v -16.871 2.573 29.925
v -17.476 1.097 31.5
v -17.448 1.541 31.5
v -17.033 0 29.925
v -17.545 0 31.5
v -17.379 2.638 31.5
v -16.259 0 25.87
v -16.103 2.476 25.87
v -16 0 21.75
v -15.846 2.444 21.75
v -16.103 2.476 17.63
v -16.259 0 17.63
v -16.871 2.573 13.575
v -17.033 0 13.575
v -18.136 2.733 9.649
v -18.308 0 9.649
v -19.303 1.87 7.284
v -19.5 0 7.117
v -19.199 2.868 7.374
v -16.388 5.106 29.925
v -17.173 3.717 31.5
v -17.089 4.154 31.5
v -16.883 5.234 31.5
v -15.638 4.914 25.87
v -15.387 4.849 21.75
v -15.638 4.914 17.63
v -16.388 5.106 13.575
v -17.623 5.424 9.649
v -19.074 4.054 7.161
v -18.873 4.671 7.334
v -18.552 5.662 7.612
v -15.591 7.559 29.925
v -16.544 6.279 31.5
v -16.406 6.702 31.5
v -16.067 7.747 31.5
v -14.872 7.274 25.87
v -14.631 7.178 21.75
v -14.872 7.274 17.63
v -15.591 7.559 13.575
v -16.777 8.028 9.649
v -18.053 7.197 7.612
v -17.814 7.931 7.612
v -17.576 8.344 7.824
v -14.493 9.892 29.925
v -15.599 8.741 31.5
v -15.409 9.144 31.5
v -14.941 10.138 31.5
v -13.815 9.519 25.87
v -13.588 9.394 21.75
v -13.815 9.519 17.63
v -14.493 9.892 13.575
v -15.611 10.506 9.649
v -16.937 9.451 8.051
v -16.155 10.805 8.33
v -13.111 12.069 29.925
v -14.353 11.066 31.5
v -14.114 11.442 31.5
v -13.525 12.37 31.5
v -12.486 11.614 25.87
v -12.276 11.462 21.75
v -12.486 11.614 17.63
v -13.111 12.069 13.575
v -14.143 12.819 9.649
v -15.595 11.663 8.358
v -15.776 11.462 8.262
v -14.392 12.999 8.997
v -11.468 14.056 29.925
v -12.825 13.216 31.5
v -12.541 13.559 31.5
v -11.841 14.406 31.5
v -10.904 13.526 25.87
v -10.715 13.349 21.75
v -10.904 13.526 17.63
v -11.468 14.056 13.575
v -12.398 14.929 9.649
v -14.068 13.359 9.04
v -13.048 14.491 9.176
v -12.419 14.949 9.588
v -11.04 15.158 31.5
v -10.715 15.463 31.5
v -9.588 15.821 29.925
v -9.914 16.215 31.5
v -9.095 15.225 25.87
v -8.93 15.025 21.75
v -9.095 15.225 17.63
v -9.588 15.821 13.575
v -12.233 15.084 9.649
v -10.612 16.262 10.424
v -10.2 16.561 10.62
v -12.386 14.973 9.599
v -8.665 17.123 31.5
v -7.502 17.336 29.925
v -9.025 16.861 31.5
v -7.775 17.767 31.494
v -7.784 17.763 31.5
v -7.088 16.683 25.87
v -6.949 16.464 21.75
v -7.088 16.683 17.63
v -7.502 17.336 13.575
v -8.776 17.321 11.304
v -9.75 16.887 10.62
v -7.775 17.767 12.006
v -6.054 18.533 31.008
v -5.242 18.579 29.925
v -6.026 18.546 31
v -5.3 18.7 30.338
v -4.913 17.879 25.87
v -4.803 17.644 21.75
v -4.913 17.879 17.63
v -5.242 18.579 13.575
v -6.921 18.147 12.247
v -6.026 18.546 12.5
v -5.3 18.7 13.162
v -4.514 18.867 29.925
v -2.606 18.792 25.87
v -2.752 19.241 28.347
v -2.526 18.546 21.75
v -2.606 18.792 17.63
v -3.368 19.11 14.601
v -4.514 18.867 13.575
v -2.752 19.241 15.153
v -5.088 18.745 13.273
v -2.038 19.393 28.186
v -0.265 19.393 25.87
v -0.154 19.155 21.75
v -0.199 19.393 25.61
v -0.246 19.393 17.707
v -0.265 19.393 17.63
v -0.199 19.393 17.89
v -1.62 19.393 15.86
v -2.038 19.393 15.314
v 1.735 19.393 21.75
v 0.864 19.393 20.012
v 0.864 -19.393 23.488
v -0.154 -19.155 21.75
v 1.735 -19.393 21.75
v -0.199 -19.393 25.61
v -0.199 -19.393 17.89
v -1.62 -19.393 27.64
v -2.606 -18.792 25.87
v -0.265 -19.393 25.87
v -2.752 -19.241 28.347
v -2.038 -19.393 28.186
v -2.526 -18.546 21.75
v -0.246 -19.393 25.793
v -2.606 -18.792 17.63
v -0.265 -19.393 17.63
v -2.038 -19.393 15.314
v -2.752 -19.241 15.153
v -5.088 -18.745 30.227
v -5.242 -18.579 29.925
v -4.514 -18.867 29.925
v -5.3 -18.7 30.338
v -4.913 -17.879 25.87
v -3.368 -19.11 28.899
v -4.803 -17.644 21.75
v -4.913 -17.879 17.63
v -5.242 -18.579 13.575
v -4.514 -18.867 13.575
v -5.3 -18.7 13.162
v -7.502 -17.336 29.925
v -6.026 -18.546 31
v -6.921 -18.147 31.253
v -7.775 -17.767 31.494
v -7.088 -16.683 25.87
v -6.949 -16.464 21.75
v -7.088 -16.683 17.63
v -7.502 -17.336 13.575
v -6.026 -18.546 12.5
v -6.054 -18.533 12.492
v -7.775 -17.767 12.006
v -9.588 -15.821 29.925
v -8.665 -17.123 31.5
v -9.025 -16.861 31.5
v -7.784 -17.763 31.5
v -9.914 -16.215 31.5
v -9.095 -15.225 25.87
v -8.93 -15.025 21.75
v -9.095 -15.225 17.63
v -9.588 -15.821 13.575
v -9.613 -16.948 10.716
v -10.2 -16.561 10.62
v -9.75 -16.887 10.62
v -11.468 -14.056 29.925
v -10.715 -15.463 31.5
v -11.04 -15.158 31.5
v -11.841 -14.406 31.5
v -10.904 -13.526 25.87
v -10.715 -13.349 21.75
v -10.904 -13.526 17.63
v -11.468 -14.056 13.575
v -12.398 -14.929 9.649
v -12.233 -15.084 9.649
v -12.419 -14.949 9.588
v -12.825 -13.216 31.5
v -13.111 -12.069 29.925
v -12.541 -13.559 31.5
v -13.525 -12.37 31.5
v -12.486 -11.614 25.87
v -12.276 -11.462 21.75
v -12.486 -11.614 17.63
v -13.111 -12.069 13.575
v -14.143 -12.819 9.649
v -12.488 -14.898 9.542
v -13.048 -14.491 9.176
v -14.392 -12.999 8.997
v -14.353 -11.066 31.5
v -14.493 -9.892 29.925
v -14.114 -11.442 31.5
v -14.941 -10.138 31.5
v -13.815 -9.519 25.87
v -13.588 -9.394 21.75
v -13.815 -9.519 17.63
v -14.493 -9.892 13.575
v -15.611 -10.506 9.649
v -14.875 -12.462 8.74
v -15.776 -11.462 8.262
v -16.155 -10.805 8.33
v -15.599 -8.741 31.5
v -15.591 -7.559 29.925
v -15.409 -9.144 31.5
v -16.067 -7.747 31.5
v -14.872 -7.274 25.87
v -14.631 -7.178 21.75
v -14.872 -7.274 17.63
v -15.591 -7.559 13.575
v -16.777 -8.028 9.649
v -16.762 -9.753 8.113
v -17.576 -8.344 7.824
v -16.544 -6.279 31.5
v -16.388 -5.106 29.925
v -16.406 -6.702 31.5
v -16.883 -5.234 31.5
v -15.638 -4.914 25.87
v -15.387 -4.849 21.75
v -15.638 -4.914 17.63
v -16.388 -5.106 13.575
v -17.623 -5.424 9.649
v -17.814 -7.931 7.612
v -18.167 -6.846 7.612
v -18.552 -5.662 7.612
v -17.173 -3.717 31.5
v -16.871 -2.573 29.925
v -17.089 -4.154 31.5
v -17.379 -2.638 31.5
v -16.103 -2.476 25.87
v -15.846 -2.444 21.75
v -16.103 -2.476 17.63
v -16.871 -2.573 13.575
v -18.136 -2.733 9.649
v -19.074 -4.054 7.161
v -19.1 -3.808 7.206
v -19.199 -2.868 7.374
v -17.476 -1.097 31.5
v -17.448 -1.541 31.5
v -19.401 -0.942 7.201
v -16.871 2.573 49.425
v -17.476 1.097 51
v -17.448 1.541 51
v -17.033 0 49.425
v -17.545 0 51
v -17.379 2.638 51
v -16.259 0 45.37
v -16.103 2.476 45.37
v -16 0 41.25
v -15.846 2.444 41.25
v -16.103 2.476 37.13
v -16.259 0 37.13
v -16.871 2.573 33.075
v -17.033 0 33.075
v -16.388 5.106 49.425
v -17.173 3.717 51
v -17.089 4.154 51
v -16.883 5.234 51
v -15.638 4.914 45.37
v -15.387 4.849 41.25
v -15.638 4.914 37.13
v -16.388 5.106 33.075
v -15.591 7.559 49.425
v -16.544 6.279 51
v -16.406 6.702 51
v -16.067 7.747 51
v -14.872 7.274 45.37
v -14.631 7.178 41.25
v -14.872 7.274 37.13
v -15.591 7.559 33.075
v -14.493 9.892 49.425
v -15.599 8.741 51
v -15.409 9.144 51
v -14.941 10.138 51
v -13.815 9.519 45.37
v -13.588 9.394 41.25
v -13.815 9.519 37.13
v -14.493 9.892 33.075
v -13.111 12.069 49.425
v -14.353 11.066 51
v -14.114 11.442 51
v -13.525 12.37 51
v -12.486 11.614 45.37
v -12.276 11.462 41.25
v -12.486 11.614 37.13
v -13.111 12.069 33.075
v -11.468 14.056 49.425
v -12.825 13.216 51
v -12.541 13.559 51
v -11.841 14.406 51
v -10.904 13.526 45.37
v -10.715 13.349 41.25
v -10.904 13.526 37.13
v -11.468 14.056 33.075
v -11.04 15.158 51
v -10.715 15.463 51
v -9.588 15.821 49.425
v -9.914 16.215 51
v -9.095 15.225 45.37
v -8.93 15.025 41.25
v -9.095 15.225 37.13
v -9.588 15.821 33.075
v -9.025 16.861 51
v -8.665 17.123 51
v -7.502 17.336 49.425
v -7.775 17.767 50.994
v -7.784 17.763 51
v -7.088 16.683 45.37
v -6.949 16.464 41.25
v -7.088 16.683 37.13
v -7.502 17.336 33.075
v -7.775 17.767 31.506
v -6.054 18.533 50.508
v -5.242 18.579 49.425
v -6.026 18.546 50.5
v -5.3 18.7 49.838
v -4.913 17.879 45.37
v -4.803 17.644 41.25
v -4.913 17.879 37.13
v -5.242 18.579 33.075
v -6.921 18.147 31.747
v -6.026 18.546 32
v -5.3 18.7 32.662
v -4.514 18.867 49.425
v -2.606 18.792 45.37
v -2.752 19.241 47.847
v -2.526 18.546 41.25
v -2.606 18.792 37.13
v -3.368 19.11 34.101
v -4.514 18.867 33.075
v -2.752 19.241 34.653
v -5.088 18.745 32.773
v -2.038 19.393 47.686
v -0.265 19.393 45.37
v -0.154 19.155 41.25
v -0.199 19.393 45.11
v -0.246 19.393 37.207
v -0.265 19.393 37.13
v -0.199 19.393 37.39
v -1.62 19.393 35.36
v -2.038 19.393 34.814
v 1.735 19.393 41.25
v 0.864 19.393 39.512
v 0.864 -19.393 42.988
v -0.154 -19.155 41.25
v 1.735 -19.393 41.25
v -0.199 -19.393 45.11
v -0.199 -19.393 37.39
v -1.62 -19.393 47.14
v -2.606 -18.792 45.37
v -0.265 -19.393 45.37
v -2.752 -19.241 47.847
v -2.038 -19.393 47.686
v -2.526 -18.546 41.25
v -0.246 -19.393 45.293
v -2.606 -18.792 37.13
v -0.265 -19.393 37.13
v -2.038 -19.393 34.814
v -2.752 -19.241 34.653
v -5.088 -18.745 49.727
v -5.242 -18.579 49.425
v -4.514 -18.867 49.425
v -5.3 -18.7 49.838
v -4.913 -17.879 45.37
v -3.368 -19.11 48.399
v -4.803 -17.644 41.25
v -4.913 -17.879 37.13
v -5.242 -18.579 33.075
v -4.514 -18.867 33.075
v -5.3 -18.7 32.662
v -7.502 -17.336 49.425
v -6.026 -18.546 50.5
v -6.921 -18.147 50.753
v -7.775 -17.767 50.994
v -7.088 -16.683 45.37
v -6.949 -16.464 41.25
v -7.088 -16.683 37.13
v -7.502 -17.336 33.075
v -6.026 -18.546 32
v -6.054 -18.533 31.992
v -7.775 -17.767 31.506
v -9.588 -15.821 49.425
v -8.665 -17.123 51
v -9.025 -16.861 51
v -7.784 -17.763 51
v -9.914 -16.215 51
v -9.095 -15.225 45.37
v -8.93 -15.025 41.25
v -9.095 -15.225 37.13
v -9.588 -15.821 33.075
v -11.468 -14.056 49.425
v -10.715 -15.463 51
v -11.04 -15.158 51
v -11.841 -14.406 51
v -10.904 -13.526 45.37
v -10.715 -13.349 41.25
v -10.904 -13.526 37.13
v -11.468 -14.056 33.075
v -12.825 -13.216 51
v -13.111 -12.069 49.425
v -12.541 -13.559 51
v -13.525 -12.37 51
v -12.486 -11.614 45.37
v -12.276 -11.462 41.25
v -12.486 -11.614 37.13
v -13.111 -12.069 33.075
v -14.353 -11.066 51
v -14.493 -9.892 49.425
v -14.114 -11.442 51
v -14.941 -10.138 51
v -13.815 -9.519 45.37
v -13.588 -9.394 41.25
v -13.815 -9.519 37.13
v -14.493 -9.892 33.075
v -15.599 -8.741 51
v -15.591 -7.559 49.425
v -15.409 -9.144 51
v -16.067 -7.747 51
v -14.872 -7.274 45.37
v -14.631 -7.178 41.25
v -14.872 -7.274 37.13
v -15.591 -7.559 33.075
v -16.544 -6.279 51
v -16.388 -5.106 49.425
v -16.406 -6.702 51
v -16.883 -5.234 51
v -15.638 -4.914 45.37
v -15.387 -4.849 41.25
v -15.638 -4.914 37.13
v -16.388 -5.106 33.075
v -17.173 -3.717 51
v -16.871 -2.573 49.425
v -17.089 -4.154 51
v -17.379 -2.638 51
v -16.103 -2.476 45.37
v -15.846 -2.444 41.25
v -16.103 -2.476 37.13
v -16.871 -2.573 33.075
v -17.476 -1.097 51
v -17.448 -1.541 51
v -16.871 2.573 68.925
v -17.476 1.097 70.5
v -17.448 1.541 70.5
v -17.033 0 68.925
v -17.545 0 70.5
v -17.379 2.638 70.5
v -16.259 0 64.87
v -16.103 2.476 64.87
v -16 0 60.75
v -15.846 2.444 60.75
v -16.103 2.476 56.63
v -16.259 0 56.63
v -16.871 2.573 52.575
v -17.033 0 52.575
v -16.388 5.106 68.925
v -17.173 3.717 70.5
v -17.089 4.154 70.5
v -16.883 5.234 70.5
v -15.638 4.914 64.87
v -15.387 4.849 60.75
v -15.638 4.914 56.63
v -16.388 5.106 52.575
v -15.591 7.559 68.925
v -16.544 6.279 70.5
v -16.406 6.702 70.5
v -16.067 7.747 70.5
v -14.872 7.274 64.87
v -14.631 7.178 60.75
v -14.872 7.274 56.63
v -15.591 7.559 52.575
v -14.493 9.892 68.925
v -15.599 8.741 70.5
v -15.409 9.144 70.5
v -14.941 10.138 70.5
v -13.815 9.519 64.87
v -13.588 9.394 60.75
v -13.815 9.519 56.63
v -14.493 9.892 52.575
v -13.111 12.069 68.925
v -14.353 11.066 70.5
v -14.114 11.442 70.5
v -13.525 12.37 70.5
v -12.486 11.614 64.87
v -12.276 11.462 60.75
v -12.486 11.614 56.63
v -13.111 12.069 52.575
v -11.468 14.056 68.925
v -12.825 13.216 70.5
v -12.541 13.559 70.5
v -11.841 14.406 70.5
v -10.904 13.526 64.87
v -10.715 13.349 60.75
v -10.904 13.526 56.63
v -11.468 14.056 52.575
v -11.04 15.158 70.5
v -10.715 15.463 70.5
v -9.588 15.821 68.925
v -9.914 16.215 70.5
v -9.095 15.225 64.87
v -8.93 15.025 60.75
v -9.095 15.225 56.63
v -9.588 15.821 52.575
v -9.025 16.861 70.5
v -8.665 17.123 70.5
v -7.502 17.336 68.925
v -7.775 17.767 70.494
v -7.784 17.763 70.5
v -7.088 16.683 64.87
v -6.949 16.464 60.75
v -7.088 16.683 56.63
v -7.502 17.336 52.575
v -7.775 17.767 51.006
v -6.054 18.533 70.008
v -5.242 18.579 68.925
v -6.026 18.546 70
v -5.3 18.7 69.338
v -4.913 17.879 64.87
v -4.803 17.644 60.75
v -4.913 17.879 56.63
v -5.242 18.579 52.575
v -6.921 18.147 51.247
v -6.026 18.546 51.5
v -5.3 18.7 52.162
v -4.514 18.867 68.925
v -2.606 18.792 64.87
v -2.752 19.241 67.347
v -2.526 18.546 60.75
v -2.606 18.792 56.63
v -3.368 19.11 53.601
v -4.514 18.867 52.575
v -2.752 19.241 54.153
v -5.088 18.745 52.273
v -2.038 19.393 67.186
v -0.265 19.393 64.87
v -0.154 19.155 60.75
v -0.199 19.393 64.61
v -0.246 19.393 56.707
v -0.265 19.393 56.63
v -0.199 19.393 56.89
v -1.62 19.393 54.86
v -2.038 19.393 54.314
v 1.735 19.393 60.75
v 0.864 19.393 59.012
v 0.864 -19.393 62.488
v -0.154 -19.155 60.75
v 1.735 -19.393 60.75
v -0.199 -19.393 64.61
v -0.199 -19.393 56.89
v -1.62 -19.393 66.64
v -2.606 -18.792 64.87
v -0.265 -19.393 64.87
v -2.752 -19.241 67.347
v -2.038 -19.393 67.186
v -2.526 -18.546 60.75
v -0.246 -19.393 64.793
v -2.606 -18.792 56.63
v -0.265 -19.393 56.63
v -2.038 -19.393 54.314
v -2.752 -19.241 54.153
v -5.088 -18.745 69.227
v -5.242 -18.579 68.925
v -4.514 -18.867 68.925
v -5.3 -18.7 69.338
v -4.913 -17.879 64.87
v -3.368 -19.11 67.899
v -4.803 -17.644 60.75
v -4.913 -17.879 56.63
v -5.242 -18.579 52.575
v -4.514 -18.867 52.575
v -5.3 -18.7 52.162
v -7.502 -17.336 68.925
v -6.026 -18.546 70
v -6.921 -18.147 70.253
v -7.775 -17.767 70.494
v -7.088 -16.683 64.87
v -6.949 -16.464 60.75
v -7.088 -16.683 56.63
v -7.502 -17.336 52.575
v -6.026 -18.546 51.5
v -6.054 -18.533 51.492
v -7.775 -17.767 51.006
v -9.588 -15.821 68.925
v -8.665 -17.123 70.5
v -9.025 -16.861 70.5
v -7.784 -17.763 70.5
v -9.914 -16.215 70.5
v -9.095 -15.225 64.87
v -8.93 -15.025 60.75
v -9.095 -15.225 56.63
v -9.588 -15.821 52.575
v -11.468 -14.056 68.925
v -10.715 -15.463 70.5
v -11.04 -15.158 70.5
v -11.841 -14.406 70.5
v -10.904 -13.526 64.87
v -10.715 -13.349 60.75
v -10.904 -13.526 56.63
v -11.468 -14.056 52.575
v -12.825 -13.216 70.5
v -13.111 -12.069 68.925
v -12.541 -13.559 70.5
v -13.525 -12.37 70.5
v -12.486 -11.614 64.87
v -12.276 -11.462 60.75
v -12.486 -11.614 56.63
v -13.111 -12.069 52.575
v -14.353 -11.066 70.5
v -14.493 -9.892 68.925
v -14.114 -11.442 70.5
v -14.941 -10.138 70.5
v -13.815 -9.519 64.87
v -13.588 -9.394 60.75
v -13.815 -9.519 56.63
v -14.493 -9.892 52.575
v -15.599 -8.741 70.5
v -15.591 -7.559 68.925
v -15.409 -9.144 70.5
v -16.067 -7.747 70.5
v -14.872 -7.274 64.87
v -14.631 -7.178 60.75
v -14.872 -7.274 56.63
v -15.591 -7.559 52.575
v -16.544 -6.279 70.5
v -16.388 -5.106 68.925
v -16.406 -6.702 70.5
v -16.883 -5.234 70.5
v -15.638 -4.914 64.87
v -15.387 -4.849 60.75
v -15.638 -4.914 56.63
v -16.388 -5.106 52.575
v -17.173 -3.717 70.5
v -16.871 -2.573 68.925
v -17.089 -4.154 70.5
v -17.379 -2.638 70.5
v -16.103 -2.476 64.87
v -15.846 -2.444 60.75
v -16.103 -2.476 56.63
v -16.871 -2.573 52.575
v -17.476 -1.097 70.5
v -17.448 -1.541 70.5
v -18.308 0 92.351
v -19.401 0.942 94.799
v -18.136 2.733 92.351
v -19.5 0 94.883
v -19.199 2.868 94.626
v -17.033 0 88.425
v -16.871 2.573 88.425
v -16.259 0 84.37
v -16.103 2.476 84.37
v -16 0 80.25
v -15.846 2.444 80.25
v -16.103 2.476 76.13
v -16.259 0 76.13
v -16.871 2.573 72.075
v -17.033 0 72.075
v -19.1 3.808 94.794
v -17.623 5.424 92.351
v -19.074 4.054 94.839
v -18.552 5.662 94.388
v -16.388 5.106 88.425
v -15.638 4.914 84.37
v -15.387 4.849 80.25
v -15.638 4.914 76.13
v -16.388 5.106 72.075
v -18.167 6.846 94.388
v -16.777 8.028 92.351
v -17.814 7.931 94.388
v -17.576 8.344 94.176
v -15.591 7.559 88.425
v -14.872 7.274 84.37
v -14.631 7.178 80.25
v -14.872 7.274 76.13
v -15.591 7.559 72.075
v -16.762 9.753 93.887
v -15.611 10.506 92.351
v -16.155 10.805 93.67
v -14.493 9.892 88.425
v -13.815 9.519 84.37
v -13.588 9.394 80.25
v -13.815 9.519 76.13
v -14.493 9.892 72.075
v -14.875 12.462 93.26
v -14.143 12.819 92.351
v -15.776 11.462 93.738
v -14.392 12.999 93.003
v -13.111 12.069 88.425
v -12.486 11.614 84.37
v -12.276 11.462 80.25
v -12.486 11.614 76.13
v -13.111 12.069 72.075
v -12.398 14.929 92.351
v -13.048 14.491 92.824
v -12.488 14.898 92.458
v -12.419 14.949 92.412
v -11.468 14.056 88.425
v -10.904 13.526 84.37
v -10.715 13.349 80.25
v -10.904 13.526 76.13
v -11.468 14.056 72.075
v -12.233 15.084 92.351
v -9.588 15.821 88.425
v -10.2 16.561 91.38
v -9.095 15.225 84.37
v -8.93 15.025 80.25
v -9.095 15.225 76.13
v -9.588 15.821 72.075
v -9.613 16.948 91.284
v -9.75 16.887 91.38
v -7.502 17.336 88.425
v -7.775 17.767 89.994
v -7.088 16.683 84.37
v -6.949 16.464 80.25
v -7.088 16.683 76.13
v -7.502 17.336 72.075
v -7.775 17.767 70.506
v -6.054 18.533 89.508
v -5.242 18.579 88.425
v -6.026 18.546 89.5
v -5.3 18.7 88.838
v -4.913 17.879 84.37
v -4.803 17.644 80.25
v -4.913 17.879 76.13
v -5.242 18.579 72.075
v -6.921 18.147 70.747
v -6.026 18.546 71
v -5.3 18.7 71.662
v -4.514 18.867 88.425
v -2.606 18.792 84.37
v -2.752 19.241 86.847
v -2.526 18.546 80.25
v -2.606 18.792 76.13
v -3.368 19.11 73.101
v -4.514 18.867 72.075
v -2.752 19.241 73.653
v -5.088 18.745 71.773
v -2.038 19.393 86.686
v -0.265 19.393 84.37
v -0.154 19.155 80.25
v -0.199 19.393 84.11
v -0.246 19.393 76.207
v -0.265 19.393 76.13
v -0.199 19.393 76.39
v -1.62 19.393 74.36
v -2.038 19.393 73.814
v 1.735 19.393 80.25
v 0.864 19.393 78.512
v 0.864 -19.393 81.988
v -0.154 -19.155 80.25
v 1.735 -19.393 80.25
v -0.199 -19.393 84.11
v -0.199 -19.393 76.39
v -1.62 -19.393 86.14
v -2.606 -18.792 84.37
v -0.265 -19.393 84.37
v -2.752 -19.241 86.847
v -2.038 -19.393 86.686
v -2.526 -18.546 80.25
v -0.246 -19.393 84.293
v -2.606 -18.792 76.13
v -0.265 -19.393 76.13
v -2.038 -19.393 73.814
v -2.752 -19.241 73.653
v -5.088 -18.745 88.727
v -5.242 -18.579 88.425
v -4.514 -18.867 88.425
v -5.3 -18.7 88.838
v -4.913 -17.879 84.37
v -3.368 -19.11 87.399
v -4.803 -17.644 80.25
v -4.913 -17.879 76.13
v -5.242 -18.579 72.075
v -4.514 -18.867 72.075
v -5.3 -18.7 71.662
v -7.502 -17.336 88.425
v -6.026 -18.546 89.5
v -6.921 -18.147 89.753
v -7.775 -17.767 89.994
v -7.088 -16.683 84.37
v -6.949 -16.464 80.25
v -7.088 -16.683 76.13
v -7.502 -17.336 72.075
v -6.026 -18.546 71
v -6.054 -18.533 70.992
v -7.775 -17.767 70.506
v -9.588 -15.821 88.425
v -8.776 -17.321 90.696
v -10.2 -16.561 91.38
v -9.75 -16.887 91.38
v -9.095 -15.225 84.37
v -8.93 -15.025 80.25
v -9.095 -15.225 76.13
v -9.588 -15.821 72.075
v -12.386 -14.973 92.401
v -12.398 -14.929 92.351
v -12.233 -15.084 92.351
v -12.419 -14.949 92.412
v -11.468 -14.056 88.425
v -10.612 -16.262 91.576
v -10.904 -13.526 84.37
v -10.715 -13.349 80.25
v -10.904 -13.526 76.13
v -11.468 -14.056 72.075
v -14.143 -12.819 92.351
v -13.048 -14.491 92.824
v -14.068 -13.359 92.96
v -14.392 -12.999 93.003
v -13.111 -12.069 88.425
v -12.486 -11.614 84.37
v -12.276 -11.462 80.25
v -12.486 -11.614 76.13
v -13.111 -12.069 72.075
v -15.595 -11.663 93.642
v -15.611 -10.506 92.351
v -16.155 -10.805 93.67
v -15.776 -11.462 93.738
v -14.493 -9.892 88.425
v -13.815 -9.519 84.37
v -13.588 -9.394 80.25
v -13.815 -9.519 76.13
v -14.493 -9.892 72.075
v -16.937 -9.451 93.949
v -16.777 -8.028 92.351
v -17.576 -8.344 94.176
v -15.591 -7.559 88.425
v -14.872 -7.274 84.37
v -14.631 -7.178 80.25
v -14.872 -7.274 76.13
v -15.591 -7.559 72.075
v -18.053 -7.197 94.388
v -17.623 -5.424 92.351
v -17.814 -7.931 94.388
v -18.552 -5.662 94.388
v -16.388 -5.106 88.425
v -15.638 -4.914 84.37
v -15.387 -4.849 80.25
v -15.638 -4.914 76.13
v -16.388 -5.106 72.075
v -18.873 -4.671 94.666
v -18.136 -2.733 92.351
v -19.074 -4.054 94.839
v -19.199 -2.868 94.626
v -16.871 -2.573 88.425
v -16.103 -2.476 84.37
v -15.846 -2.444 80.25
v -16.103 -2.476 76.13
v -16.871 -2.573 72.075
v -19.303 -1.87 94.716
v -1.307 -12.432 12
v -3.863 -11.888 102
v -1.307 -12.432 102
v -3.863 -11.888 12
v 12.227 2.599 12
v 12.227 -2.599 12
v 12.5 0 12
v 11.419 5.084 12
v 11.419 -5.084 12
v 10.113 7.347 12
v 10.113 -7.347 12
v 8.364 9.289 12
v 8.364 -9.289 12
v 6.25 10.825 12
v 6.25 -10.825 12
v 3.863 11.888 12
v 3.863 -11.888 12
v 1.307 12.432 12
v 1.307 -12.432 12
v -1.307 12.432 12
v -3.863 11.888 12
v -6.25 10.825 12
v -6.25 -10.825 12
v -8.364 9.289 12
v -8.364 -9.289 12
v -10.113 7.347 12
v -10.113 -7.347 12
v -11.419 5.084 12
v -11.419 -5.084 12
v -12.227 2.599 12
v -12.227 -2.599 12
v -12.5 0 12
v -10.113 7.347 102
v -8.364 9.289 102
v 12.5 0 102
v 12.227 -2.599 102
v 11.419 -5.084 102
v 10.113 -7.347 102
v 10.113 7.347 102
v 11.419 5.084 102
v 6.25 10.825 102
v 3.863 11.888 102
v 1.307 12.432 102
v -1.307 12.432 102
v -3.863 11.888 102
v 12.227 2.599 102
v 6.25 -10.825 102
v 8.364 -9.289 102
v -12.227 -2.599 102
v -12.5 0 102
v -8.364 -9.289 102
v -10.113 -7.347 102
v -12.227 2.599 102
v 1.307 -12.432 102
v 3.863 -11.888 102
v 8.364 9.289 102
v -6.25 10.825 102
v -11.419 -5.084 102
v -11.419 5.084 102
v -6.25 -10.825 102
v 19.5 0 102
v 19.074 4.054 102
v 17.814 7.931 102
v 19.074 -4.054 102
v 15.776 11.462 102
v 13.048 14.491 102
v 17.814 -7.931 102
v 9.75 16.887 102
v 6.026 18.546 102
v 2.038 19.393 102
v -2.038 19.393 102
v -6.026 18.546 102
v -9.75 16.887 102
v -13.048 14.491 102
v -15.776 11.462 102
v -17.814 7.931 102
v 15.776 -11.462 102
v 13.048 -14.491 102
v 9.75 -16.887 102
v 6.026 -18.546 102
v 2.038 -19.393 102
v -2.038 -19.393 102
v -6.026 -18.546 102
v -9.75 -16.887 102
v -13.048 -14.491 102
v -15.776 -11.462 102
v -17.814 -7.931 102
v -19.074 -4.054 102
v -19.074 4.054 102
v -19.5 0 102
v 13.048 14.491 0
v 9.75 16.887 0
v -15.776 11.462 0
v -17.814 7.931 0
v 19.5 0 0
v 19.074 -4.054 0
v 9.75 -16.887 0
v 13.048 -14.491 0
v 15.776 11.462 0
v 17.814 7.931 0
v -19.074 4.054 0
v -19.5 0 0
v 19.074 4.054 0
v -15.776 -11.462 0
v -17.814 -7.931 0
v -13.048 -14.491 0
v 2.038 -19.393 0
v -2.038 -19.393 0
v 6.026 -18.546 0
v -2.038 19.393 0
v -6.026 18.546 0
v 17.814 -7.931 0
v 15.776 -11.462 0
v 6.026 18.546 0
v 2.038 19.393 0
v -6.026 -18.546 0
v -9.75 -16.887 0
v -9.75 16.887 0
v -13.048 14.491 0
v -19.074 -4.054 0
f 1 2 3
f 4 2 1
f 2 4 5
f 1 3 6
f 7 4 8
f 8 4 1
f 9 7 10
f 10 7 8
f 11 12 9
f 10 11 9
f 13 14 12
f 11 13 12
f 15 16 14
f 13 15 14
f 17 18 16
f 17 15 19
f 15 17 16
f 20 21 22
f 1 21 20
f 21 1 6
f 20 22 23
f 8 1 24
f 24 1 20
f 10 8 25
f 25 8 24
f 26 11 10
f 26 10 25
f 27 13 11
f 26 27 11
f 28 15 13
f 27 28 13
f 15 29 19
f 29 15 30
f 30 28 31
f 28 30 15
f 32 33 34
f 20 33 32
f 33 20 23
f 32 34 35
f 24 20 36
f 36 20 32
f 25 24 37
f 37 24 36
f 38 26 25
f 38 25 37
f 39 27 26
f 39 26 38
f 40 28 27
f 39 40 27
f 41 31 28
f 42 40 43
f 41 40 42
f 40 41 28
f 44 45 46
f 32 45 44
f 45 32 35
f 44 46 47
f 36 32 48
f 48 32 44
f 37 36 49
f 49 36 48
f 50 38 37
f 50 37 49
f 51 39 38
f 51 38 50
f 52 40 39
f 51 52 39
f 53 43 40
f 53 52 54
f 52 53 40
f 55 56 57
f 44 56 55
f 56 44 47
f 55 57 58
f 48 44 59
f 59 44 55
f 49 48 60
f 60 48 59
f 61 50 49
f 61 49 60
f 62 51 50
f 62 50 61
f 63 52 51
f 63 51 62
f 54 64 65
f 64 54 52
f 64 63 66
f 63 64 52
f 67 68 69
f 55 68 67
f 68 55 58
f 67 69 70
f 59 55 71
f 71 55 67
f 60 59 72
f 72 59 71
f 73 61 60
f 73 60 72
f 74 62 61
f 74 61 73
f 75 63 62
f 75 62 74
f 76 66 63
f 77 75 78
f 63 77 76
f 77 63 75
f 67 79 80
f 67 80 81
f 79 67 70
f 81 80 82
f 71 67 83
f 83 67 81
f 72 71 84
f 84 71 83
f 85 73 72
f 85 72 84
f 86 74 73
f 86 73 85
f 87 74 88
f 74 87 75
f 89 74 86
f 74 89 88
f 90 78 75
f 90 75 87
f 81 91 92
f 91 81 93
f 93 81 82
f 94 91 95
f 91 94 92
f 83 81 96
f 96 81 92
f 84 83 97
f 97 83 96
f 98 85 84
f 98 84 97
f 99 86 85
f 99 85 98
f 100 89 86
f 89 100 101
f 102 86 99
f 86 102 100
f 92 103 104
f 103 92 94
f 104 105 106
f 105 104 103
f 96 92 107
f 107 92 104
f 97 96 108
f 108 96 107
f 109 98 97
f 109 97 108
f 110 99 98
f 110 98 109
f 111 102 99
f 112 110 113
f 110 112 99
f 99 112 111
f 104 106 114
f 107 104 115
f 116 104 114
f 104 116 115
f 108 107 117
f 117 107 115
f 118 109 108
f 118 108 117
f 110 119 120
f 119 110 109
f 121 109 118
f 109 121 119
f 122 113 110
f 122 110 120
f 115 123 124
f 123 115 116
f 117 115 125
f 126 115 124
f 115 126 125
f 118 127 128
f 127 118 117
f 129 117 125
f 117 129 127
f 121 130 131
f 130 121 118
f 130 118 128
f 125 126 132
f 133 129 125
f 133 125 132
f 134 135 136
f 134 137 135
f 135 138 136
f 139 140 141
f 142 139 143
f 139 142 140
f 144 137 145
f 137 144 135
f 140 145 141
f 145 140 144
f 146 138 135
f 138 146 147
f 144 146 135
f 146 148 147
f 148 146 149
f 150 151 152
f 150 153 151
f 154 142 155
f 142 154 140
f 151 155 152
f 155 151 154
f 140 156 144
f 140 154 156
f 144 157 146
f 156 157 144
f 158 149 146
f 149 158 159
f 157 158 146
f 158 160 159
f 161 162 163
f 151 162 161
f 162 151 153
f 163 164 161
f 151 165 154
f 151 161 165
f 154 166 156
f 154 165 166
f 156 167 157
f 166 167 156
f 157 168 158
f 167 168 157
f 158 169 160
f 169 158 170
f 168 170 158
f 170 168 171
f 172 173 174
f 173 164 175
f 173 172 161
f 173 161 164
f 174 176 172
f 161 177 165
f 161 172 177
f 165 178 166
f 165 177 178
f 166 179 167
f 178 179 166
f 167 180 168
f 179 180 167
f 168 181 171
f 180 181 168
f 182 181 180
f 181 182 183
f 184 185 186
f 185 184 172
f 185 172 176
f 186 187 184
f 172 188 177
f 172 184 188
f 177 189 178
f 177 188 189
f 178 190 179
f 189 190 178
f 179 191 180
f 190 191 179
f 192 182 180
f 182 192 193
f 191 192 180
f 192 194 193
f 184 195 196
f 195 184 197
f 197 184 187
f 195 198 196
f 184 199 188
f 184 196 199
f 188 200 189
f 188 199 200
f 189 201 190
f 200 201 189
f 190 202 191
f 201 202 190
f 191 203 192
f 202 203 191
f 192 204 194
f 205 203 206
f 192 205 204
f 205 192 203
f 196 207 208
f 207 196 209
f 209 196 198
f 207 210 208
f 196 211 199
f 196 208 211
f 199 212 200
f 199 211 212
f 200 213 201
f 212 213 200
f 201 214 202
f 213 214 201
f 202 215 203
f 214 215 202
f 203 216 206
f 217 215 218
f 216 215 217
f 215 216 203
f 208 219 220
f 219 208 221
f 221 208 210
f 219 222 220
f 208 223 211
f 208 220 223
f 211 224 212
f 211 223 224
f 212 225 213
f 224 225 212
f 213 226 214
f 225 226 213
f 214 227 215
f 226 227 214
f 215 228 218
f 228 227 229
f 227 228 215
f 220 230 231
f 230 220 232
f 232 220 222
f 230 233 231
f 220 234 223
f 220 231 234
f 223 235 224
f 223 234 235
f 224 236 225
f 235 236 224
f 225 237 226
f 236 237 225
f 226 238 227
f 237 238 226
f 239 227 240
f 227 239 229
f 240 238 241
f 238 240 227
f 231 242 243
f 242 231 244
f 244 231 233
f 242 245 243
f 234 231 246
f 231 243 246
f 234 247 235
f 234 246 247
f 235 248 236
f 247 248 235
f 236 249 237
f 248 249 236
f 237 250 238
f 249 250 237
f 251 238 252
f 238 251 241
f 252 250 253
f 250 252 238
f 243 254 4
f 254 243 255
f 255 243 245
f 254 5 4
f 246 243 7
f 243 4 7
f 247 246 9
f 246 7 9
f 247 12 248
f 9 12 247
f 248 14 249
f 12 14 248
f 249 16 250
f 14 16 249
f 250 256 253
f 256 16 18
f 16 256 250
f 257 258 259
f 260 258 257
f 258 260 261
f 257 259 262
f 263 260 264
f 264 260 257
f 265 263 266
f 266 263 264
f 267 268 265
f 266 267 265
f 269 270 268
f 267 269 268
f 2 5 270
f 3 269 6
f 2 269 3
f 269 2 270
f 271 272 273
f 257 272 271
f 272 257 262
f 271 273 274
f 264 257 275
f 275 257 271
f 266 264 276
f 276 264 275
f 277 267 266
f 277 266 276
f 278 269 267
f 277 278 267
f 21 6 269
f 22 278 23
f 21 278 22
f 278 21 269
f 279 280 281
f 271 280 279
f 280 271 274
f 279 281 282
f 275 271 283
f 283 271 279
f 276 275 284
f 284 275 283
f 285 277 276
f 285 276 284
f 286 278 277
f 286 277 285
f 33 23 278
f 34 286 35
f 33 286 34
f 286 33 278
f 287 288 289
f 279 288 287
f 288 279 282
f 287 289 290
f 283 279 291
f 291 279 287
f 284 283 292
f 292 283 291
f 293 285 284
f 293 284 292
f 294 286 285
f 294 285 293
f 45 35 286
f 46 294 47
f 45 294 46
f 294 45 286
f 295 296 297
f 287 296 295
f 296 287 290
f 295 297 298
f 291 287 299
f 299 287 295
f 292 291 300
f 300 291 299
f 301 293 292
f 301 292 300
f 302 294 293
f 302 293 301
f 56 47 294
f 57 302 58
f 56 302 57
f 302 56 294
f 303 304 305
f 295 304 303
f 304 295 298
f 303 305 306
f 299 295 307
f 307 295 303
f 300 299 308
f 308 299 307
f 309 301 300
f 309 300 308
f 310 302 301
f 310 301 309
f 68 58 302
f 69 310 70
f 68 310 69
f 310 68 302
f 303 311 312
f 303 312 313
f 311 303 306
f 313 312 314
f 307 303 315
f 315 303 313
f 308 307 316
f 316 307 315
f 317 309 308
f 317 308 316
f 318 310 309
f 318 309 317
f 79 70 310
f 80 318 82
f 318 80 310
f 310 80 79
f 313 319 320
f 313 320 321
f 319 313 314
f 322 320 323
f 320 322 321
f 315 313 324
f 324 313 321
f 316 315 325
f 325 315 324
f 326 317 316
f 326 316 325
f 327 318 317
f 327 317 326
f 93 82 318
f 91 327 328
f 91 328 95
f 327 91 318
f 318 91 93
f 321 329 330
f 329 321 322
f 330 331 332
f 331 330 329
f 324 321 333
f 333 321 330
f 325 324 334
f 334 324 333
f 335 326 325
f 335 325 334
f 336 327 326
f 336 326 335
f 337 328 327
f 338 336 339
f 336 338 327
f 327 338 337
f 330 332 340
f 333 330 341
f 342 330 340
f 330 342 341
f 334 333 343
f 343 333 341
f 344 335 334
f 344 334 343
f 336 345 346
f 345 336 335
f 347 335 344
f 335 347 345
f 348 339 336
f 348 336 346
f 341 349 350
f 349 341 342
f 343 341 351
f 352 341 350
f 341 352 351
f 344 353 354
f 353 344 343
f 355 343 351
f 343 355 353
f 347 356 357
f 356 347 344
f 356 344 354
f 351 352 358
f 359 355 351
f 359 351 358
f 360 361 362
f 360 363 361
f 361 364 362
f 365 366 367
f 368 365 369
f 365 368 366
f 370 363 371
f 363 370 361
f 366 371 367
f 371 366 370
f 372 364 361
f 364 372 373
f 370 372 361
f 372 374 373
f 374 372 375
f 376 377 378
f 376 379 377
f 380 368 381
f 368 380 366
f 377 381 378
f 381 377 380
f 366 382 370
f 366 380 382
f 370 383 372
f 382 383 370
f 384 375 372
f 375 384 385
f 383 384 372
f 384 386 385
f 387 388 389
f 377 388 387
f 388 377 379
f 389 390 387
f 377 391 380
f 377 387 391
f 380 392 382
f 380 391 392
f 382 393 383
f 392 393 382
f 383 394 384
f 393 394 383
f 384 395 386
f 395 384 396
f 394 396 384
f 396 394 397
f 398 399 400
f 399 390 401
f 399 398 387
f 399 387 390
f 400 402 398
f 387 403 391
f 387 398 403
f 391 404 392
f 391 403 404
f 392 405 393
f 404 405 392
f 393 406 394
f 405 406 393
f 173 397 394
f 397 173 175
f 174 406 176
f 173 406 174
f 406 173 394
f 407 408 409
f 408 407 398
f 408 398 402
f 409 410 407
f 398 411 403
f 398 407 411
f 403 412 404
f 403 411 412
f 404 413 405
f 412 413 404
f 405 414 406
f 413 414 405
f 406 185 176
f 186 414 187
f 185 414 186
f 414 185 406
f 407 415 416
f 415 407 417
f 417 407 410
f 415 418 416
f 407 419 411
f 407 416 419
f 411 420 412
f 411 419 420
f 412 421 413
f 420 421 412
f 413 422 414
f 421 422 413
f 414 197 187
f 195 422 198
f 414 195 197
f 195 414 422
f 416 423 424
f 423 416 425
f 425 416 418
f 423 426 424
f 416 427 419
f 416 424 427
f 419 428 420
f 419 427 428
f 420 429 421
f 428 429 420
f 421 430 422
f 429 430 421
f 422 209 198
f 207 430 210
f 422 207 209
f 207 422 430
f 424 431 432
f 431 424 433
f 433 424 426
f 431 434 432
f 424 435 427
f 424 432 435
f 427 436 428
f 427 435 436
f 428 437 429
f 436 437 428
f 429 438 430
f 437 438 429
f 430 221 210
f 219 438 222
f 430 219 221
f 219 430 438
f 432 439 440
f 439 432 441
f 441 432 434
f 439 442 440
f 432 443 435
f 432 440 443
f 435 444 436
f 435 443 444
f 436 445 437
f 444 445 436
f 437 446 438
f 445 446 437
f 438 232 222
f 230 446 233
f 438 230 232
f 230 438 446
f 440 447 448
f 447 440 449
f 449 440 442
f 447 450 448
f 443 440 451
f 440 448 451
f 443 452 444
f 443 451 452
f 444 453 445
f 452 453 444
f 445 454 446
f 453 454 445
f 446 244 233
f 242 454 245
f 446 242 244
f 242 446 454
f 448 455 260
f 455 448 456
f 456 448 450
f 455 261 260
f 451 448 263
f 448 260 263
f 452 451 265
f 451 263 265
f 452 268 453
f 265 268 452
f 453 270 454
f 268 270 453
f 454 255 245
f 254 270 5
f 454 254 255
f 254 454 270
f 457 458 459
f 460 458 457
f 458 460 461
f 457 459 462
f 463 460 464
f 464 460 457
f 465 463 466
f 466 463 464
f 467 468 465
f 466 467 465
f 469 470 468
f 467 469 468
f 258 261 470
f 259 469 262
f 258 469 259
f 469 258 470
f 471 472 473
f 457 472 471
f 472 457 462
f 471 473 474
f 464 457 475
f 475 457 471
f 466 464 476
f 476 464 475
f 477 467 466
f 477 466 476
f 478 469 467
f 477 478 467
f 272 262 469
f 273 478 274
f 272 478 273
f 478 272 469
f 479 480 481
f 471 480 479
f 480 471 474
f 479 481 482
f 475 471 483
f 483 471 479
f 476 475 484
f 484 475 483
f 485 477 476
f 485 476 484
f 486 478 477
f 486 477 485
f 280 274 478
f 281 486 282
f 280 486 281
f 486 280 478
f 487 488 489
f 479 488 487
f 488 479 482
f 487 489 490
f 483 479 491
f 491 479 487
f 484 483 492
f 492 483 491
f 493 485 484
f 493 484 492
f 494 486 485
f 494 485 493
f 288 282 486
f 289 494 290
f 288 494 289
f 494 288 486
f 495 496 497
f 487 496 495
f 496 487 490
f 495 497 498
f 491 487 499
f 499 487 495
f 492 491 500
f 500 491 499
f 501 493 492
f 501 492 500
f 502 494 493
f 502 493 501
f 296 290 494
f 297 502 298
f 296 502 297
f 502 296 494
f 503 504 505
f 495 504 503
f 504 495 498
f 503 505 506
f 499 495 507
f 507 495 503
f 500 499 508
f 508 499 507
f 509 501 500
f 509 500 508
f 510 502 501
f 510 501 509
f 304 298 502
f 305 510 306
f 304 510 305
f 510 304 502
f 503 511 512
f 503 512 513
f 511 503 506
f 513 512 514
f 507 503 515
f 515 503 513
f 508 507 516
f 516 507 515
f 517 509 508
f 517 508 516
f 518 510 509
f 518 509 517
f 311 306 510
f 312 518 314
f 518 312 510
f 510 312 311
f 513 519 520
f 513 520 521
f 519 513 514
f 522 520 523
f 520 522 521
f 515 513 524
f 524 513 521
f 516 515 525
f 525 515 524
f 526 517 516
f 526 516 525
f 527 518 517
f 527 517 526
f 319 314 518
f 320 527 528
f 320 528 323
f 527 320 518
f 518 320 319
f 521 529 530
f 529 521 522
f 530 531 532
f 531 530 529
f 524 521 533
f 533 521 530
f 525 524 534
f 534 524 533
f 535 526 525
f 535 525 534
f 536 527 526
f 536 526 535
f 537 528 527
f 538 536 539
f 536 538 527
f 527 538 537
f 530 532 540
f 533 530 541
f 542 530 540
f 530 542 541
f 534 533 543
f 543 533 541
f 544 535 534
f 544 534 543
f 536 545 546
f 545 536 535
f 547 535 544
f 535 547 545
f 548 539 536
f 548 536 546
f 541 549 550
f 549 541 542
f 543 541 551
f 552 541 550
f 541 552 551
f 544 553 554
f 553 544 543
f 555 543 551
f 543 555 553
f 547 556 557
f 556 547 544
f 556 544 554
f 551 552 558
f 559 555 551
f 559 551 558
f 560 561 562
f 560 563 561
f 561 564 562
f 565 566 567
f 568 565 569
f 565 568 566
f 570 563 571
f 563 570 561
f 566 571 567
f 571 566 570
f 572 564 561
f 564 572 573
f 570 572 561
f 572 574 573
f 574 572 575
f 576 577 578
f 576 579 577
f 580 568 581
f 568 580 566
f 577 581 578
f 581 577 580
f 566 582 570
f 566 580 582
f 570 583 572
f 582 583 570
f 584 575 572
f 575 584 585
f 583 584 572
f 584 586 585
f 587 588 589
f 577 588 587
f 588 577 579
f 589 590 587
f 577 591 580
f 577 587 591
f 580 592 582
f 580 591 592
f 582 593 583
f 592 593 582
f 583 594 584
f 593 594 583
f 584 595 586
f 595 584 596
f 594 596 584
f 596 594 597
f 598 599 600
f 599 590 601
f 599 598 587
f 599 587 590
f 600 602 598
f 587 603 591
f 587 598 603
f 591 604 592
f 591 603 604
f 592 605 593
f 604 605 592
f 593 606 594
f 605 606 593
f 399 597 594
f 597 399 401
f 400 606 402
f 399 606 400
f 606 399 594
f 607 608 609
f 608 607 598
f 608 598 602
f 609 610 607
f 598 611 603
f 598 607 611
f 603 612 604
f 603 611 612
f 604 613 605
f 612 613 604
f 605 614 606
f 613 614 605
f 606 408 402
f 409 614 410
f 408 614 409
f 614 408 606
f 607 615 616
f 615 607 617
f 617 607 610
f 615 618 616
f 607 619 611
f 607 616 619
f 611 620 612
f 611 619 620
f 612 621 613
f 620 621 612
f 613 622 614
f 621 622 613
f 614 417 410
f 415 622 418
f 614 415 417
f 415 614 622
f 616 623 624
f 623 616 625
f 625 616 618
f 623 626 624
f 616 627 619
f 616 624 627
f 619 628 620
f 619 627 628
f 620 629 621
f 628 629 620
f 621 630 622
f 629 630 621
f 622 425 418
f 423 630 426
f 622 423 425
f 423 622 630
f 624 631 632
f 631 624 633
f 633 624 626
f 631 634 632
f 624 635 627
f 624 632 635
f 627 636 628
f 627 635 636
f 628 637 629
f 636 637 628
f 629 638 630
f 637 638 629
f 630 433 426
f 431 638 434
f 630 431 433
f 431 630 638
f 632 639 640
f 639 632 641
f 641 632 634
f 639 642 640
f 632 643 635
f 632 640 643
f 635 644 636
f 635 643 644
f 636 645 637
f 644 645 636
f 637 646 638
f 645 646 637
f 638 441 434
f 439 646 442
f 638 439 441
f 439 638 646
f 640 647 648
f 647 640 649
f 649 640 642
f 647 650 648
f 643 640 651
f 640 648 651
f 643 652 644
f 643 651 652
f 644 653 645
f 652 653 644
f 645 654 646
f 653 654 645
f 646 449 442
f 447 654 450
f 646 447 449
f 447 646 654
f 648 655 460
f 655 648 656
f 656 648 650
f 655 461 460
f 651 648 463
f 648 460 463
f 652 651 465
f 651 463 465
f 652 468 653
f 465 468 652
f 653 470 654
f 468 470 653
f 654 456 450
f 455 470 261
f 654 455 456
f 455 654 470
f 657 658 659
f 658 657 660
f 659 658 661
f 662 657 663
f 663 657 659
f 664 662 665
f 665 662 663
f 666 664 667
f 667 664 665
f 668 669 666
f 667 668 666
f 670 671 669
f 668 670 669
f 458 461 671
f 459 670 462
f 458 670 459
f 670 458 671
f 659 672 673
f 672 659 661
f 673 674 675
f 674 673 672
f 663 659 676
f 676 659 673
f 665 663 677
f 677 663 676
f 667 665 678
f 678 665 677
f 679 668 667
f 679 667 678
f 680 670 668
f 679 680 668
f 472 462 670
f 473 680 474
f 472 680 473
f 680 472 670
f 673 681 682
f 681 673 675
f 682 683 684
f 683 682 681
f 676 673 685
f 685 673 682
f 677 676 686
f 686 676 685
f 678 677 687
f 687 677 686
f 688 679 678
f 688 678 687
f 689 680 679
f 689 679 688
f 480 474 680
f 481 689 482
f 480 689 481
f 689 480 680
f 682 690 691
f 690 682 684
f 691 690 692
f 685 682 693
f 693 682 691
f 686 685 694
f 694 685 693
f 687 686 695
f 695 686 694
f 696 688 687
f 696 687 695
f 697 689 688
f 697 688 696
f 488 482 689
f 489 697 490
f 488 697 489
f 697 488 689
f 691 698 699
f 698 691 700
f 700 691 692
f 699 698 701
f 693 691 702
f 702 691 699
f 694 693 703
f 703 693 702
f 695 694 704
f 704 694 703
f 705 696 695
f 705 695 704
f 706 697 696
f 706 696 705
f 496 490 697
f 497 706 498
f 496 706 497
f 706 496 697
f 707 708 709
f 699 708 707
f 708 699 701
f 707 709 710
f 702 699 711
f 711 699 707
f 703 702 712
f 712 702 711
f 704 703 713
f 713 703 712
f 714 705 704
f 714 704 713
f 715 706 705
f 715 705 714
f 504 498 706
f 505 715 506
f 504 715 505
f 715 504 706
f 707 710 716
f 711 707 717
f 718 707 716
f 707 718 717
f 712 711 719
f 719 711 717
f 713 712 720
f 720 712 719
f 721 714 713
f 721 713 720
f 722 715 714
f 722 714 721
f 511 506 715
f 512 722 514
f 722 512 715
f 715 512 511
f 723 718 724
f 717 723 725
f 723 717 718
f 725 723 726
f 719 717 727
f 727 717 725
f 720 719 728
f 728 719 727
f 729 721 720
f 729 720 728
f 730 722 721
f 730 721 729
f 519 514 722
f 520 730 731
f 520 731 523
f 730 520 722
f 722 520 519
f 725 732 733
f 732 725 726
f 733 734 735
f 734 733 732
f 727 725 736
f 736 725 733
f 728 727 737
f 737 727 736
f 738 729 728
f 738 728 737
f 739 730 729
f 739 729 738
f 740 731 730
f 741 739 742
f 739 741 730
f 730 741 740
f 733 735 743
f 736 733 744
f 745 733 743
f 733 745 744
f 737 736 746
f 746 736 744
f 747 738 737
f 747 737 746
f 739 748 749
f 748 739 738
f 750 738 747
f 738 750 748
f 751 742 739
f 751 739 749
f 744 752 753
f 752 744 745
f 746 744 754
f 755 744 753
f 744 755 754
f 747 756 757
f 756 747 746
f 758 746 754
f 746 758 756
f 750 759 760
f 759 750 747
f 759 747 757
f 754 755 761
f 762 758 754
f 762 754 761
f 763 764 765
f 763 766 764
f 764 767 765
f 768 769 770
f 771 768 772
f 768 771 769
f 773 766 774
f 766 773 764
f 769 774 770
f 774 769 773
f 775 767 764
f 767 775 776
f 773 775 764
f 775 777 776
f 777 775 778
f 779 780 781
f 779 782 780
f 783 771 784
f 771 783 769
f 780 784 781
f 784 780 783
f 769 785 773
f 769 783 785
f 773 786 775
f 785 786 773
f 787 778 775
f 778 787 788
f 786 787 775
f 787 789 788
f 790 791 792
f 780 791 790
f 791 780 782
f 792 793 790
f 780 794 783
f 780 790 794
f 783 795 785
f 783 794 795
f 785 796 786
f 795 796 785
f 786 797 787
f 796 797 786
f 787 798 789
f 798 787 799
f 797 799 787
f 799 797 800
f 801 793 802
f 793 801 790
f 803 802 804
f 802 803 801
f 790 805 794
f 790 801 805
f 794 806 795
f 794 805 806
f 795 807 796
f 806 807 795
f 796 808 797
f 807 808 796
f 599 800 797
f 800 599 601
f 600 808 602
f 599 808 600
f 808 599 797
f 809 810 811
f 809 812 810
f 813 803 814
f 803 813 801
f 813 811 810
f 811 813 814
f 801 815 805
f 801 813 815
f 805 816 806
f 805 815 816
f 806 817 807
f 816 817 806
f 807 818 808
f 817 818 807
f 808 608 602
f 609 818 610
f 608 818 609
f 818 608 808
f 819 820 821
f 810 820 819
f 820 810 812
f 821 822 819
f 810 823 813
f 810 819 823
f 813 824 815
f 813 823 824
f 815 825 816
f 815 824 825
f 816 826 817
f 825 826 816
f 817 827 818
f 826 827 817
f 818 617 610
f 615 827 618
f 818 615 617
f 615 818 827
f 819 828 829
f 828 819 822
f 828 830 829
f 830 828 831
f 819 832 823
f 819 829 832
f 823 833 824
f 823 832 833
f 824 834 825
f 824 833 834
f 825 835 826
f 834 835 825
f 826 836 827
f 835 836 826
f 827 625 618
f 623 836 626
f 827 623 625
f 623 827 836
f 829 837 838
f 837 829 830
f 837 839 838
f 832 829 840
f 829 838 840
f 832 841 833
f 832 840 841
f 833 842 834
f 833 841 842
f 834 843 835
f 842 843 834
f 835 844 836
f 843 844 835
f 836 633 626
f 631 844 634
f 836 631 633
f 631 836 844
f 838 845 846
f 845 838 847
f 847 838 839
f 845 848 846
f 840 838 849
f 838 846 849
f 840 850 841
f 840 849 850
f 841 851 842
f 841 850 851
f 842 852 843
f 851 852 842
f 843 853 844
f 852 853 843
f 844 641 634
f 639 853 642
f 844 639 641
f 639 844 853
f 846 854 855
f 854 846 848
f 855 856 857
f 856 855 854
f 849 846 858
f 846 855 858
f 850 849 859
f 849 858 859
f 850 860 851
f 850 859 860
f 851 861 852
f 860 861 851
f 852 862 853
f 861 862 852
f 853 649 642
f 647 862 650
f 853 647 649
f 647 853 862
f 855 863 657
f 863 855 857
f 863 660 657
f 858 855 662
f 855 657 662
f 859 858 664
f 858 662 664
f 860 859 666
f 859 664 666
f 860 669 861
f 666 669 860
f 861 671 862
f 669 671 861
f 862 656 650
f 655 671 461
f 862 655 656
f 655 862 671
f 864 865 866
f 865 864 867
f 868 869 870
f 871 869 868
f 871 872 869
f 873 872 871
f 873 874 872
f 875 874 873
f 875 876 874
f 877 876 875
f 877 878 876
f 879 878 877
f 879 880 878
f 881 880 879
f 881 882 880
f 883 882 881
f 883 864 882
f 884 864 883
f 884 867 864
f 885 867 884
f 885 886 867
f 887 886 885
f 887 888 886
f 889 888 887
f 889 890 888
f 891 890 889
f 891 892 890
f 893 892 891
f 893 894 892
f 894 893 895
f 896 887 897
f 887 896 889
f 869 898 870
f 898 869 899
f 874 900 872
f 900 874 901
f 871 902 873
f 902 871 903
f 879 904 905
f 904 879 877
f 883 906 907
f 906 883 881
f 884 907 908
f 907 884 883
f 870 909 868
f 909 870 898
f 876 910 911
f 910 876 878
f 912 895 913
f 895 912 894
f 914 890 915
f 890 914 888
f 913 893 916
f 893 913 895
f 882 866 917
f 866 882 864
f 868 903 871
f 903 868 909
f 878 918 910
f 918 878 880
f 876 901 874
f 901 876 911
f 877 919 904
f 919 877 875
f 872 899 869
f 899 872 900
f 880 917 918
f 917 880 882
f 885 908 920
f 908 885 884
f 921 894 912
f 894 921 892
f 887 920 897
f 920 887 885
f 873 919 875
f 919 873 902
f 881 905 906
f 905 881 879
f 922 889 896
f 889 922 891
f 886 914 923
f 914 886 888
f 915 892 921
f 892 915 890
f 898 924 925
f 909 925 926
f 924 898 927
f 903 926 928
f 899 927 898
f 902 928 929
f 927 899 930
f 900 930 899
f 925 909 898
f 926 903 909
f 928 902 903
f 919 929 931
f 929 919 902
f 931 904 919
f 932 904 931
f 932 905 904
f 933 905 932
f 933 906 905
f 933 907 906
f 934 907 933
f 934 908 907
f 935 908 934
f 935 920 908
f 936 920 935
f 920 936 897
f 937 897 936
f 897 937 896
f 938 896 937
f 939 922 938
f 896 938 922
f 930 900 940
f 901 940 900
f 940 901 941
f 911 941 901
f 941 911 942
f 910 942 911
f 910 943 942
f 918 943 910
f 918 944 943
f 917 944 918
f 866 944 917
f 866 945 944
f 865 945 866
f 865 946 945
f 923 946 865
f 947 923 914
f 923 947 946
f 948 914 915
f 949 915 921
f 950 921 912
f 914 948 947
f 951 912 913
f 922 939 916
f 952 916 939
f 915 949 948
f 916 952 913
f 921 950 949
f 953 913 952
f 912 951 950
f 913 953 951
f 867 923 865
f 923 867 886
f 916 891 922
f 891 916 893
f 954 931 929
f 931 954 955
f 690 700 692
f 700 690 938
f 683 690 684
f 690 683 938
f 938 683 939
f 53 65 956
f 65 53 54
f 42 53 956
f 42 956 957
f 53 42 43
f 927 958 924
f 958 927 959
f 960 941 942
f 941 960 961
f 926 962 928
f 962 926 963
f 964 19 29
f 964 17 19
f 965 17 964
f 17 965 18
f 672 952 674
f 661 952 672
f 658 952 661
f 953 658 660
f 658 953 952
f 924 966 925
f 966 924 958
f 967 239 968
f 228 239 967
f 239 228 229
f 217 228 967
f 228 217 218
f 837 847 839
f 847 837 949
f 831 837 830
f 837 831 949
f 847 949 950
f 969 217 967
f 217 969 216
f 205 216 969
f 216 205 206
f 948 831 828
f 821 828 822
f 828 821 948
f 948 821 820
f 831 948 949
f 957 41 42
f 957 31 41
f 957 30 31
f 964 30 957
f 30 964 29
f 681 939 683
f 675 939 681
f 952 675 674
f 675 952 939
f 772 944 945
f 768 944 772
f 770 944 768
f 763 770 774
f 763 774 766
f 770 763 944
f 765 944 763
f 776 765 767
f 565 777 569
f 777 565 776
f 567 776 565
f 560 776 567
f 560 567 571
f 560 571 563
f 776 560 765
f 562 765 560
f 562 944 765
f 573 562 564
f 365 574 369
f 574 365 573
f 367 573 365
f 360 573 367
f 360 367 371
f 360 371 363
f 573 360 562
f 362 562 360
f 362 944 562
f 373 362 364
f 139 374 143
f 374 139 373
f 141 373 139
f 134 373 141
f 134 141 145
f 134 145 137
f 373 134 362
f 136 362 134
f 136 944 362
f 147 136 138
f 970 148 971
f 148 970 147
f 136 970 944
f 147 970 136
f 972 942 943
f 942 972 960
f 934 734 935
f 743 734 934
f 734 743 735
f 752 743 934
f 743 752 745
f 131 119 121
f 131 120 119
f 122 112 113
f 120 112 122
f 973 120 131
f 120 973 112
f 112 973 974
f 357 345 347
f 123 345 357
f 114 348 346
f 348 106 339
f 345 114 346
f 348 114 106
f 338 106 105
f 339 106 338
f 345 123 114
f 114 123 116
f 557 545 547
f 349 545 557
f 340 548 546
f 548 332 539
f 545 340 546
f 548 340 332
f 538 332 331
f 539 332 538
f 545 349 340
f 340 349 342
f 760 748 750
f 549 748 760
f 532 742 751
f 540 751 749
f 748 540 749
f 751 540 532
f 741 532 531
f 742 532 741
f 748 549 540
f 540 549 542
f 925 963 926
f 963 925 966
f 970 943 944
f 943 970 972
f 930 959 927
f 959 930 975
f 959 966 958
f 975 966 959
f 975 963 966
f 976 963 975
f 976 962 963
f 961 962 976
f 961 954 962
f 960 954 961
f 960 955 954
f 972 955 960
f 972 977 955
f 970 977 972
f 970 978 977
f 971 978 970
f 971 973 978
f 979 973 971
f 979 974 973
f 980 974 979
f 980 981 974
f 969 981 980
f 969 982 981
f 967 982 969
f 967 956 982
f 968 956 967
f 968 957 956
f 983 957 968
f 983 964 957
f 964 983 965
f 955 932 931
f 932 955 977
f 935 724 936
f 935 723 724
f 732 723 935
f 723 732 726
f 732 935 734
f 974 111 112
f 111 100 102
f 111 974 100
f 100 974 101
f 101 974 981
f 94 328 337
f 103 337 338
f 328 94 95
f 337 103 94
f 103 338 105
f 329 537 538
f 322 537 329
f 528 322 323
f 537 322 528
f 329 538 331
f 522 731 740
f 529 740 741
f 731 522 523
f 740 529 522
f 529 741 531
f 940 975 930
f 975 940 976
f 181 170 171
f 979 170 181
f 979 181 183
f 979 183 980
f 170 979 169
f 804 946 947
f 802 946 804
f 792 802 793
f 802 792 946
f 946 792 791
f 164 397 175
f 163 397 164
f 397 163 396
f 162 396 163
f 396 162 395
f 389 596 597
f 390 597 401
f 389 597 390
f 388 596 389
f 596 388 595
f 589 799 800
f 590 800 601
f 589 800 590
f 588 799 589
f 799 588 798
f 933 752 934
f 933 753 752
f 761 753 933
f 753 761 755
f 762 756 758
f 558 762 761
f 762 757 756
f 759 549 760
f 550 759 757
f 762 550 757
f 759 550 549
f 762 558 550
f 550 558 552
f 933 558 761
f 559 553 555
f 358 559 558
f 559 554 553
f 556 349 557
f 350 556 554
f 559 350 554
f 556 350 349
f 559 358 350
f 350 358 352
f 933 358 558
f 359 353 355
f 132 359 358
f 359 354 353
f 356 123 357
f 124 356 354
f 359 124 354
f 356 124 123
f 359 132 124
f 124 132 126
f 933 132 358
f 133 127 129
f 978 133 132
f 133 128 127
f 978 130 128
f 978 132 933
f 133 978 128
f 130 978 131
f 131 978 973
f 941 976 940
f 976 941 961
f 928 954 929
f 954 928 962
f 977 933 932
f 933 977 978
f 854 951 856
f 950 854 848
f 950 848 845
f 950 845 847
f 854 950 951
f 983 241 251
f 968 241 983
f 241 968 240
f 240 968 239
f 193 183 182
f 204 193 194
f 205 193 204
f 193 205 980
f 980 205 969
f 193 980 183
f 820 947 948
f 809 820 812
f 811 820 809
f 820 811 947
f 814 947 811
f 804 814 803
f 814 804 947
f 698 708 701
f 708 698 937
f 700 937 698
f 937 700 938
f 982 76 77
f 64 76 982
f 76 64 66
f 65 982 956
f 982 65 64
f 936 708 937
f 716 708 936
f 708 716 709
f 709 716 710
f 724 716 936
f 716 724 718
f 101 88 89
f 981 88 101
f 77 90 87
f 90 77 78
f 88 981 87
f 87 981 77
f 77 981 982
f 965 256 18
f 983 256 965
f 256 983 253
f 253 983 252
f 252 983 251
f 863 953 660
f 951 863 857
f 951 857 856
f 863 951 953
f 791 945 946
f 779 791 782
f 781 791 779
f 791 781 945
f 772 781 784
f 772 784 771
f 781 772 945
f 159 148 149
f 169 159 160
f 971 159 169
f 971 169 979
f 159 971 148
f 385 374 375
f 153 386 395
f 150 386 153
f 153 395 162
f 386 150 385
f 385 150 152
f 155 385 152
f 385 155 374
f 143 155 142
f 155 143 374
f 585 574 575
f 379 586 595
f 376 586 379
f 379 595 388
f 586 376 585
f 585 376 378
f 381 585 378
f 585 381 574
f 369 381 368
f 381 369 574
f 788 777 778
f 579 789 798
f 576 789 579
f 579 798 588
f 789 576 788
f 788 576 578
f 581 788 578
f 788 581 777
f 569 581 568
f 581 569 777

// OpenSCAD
// preview[view:north, tilt:top diagonal]

//What diameter does the broom handle have?
stick_diameter = 25;

//On average, how far apart are your fingers (center to center)?
finger_spacing = 23; //[10:35]

//How much thicker do you want the handle to be than the original broom handle?
padding = "Some"; //[A lot thicker,Some,Only a little]

if(padding=="A lot thicker") assign(pad=12) handle(pad);
if(padding=="Only a little") assign(pad=3) handle(pad);
if(padding=="Some") assign(pad=7) handle(pad);


module handle(padd){
	
	ir=stick_diameter/2;
	or=ir+padd;
	hi=4*finger_spacing+10;
	edge=padd+5;
	res=50*1;
	
	difference(){
		cylinder(r=or,h=hi);
	
		union(){
			for(i=[0:3])translate([(or-ir)/2,0,edge+((hi-2*edge)*(i+.5)/4)]){
				rotate_extrude(convexity = 10, $fn = res)
				translate([or*(2+.4*(12/padd)), 0, 0])
				circle(r = (1+.4*(12/padd))*or, $fn = res);
			}
			translate([0,0,edge])cylinder(r=ir,h=hi-edge);
		}
	}

}
